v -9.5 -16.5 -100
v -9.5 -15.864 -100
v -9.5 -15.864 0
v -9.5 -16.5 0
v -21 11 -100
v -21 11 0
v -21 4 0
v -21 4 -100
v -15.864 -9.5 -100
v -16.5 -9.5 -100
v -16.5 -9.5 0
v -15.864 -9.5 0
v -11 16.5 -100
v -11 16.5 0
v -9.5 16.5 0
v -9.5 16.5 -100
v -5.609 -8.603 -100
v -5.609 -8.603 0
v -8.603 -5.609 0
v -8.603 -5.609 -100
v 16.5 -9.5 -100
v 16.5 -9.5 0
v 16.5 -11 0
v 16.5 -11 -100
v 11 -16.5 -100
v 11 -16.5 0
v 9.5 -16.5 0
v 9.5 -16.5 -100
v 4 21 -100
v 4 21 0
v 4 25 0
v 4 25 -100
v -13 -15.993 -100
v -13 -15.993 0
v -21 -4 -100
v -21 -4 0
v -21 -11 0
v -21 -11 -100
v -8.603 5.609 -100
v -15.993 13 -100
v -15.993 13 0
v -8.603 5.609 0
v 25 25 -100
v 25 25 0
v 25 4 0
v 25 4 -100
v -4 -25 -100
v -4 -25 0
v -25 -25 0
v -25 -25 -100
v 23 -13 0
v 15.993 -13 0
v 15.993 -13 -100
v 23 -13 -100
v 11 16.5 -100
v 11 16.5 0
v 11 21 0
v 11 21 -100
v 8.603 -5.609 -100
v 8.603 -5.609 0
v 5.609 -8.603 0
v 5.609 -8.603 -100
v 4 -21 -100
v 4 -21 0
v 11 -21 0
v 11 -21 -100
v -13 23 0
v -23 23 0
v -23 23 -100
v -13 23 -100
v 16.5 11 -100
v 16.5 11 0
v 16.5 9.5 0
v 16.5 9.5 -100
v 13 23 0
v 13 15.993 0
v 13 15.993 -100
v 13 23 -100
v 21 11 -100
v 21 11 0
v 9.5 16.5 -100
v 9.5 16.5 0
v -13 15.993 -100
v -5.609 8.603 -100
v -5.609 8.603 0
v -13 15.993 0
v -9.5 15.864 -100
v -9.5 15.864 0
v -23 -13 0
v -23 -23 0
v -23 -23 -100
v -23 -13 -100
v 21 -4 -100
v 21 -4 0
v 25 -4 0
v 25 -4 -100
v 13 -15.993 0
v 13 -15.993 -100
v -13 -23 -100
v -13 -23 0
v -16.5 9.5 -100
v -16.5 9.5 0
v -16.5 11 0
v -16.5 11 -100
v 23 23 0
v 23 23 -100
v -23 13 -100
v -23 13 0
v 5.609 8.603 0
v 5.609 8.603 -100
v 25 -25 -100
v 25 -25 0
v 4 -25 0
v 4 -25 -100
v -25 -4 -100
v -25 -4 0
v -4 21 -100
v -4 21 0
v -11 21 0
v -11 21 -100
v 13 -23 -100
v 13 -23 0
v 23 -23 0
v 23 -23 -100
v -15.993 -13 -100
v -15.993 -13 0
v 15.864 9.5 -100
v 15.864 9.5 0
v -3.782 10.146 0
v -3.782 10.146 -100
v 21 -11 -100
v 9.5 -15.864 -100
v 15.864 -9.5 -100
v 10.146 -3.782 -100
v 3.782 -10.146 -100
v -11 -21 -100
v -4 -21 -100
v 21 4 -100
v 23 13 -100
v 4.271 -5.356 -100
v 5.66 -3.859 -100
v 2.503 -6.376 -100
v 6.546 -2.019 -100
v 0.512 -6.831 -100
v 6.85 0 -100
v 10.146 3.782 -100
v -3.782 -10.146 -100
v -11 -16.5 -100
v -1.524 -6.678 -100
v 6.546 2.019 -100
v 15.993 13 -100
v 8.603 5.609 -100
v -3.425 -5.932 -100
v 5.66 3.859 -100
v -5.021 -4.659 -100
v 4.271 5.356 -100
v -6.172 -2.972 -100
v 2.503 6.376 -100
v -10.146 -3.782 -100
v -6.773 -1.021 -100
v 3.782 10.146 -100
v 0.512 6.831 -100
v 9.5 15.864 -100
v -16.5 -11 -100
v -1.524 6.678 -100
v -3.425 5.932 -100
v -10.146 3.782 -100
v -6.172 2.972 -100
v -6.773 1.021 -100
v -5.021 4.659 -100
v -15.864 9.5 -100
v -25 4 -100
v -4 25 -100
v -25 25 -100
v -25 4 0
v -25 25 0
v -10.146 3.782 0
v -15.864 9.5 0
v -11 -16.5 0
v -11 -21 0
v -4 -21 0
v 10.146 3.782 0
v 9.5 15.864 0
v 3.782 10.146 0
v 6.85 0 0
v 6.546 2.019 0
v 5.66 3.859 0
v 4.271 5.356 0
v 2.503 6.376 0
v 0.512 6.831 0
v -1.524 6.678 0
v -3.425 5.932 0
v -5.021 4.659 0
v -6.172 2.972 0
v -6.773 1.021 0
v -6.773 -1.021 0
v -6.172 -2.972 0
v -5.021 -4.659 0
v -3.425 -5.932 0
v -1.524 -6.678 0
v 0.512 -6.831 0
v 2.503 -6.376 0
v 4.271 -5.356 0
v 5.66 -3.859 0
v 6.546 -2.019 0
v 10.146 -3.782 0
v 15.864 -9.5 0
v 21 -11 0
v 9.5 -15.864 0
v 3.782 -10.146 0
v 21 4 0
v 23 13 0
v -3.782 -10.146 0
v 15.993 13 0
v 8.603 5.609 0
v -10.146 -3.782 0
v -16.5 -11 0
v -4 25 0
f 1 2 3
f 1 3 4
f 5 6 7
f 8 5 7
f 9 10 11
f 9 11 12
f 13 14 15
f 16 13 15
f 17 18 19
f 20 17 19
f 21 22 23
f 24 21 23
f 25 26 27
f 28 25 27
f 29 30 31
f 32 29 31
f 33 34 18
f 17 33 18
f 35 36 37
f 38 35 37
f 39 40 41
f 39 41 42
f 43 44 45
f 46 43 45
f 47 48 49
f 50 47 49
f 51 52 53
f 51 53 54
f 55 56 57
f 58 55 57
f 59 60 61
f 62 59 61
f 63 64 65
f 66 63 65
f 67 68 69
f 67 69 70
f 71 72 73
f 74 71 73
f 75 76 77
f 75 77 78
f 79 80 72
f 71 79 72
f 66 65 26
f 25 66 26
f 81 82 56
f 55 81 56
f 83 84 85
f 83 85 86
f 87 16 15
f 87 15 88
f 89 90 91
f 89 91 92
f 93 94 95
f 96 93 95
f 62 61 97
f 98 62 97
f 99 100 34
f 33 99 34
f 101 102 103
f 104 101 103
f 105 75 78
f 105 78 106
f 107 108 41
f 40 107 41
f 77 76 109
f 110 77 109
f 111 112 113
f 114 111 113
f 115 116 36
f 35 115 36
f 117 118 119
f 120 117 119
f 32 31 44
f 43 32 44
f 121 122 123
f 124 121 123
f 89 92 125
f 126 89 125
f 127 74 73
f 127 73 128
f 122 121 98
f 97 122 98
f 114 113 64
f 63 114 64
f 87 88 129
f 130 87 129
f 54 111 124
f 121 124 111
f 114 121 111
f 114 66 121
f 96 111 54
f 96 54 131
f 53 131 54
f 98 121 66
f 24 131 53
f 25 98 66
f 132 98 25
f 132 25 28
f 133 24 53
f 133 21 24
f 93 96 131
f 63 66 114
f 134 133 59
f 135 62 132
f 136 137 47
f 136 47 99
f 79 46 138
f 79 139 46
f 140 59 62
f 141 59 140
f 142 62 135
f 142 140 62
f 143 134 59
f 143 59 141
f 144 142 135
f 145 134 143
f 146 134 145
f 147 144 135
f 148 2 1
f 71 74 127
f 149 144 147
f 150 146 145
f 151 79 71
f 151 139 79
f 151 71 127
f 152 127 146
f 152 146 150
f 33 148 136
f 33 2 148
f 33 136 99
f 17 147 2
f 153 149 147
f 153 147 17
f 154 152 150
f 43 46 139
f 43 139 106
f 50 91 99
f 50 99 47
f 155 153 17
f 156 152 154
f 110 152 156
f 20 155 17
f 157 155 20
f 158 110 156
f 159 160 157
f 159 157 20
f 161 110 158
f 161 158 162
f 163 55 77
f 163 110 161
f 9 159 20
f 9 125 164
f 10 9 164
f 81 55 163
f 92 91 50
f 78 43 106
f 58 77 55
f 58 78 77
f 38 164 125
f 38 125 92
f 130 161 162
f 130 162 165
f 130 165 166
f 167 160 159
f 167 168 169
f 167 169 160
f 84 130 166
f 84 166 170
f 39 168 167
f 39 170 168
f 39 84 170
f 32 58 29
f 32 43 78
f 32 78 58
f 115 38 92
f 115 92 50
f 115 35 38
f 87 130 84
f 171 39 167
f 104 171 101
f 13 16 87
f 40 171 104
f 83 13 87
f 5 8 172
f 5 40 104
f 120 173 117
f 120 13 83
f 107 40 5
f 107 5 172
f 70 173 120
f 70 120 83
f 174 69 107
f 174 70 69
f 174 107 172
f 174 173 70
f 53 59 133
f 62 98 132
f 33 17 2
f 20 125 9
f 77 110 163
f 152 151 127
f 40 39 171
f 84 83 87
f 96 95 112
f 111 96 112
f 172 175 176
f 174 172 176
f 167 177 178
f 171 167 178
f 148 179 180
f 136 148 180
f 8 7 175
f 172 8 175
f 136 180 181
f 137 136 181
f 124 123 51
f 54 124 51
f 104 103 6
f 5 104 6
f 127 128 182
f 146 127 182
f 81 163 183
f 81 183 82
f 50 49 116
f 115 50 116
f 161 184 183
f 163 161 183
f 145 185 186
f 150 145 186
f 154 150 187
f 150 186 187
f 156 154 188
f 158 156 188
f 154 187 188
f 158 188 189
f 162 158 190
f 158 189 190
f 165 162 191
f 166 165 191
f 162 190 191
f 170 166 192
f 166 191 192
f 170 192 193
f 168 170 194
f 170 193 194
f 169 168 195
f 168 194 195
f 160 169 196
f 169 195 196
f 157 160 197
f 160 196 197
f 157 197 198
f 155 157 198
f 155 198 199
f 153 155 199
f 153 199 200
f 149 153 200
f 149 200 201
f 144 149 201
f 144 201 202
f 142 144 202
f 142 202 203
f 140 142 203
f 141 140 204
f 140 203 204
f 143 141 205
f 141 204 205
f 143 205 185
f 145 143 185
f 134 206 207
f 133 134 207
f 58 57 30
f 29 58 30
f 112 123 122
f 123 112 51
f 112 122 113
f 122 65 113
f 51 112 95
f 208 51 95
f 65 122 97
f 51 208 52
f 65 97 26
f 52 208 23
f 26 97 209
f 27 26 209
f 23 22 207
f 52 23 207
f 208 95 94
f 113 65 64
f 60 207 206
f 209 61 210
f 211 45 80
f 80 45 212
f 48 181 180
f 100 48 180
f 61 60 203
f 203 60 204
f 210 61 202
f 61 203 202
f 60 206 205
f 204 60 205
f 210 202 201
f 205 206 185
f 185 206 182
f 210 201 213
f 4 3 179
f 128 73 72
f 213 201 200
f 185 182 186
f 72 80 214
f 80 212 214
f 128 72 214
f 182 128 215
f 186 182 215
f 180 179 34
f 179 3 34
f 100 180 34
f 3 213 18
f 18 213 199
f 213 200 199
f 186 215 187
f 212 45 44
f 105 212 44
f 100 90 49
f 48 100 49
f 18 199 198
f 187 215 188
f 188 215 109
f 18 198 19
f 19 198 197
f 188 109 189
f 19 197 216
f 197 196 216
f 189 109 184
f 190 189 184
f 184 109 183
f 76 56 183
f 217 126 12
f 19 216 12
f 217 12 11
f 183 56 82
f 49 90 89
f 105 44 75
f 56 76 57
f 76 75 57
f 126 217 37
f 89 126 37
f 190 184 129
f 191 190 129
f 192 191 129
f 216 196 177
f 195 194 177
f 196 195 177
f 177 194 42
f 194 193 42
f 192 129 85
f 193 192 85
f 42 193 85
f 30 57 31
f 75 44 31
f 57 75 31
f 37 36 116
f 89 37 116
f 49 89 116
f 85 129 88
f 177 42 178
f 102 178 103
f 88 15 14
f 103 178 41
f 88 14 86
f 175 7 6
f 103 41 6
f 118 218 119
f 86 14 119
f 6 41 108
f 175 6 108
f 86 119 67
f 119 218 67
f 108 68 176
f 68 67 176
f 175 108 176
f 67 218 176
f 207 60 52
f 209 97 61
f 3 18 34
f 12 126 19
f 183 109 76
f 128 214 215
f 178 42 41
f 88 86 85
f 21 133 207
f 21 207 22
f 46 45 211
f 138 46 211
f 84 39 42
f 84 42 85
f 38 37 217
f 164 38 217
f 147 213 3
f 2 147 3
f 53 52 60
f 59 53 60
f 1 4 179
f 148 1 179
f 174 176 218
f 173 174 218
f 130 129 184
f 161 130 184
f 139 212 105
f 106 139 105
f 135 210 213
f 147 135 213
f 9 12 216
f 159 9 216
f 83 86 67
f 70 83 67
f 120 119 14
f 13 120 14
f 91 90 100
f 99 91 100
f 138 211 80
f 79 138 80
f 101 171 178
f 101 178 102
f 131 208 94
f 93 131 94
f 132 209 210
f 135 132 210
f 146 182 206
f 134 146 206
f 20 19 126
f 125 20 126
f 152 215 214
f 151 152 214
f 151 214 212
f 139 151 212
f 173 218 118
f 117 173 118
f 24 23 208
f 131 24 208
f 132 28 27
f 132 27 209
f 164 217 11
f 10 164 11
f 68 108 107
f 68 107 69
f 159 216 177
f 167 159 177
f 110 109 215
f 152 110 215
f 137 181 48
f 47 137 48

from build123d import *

# Parameters (mm, degrees)
SKETCH_A01_1_R     = 6.85
SKETCH_A01_1_W     = 10
SKETCH_A01_1_H     = 10
EXTRUDE1_DEPTH     = 100
CUT_EXTRUDE1_DEPTH = 101
CIRPATTERN1_COUNT  = 4


with BuildPart() as part:
    # Sketch A01-1 → Extrude1 (new body)
    with BuildSketch(Plane.XY):
        Polygon((-16.5, -11), (-16.5, -9.5), (-15.863961, -9.5), (-10.14602885, -3.78206785), (-10.14602885, 3.78206785), (-15.863961, 9.5), (-16.5, 9.5), (-16.5, 11), (-21, 11), (-21, 4), (-25, 4), (-25, 25), (-4, 25), (-4, 21), (-11, 21), (-11, 16.5), (-9.5, 16.5), (-9.5, 15.863961), (-3.78206785, 10.14602885), (3.78206785, 10.14602885), (9.5, 15.863961), (9.5, 16.5), (11, 16.5), (11, 21), (4, 21), (4, 25), (25, 25), (25, 4), (21, 4), (21, 11), (16.5, 11), (16.5, 9.5), (15.863961, 9.5), (10.14602885, 3.78206785), (10.14602885, -3.78206785), (15.863961, -9.5), (16.5, -9.5), (16.5, -11), (21, -11), (21, -4), (25, -4), (25, -25), (4, -25), (4, -21), (11, -21), (11, -16.5), (9.5, -16.5), (9.5, -15.863961), (3.78206785, -10.14602885), (-3.78206785, -10.14602885), (-9.5, -15.863961), (-9.5, -16.5), (-11, -16.5), (-11, -21), (-4, -21), (-4, -25), (-25, -25), (-25, -4), (-21, -4), (-21, -11), align=None)
        Circle(SKETCH_A01_1_R, mode=Mode.SUBTRACT)
        with Locations((-18, -18)):
            Rectangle(SKETCH_A01_1_W, SKETCH_A01_1_H, mode=Mode.SUBTRACT)
        with Locations((18, -18)):
            Rectangle(SKETCH_A01_1_W, SKETCH_A01_1_H, mode=Mode.SUBTRACT)
        with Locations((-18, 18)):
            Rectangle(SKETCH_A01_1_W, SKETCH_A01_1_H, mode=Mode.SUBTRACT)
        with Locations((18, 18)):
            Rectangle(SKETCH_A01_1_W, SKETCH_A01_1_H, mode=Mode.SUBTRACT)
    extrude(amount=-EXTRUDE1_DEPTH)

    # Sketch1 → Cut-Extrude1 (cut, through all)
    with BuildSketch(Plane.XY):
        Polygon((-15.993494496, 13), (-8.602622103, 5.609127607), (-5.609127607, 8.602622103), (-13, 15.993494496), align=None)
    cut_extrude1 = extrude(amount=-CUT_EXTRUDE1_DEPTH, mode=Mode.SUBTRACT)

    # CirPattern1: Cut-Extrude1 ×4 about axis
    cirpattern1_axis = Axis((0, 0, 0), (0, 0, 1))
    for i in range(1, CIRPATTERN1_COUNT):
        add(cut_extrude1.rotate(cirpattern1_axis, i * 360 / CIRPATTERN1_COUNT), mode=Mode.SUBTRACT)


solid = part.part
